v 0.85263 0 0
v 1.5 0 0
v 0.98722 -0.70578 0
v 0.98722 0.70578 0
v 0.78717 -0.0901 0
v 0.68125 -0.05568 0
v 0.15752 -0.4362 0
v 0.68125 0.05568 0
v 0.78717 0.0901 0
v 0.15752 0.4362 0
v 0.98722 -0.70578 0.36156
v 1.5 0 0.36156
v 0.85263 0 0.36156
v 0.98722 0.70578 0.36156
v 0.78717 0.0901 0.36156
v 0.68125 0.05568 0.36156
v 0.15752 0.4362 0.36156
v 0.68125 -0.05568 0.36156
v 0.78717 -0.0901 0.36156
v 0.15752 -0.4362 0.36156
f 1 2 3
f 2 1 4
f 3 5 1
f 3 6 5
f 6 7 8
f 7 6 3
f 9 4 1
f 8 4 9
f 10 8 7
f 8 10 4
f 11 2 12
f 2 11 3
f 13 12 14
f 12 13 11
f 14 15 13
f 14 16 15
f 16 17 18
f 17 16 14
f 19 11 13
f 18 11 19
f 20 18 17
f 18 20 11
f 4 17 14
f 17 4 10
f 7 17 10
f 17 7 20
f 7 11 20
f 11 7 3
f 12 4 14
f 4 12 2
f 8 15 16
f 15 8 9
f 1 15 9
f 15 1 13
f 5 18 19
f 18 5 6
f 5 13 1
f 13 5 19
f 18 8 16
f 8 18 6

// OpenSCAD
EPS = 0.01;

module loop0() {
    translate([0.7578947368421053, 0.0, 0])
    circle(r=0.7421052631578947);
}

module loop1() {
    translate([0.7578947368421053, 0.0, 0])
    circle(r=0.09473684210526316);
}

difference() {
    linear_extrude(height=0.3515625 + EPS)
    loop0();
    linear_extrude(height=0.3515625 + EPS)
    loop1();
}
